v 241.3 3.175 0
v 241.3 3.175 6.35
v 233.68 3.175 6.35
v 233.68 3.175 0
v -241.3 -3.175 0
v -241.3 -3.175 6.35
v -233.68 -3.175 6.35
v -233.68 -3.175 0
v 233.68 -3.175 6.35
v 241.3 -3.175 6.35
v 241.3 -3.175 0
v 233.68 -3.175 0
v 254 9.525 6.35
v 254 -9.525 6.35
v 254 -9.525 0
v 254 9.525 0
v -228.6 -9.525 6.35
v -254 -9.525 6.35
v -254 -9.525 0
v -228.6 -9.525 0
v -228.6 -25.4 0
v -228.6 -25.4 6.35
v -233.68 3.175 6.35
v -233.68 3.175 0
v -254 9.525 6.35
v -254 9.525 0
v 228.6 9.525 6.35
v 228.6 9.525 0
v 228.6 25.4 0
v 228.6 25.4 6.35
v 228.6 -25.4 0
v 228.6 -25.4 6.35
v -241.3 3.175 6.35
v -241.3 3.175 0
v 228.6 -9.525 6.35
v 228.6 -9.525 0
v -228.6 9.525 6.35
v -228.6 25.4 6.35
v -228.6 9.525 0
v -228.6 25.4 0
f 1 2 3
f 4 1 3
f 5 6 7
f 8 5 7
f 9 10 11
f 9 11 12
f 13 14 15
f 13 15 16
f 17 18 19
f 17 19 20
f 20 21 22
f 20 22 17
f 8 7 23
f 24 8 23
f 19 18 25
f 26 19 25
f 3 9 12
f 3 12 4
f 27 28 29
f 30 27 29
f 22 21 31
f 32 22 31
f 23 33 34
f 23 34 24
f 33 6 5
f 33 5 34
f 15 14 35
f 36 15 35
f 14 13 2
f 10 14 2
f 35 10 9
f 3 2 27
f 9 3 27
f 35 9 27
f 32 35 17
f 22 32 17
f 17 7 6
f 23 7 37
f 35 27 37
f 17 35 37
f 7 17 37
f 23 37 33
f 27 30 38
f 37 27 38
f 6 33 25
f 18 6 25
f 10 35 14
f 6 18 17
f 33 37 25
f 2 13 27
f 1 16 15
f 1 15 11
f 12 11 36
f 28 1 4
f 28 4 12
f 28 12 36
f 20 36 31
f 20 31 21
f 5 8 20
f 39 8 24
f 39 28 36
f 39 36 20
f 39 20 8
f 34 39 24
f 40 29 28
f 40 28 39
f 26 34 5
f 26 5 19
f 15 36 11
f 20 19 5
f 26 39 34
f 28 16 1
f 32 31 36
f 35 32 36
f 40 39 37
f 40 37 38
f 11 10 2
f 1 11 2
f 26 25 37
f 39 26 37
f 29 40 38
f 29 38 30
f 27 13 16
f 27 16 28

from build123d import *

# Parameters (mm, degrees)
SKETCH1_W           = 457.2
SKETCH1_H           = 50.8
BOSS_EXTRUDE1_DEPTH = 6.35
SKETCH2_W           = 50.8
SKETCH2_H           = 19.05
BOSS_EXTRUDE2_DEPTH = 6.35
SKETCH3_W           = 7.62
SKETCH3_H           = 6.35
CUT_EXTRUDE1_DEPTH  = 7.35


with BuildPart() as part:
    # Sketch1 → Boss-Extrude1 (new body)
    with BuildSketch(Plane.XY):
        Rectangle(SKETCH1_W, SKETCH1_H)
    extrude(amount=BOSS_EXTRUDE1_DEPTH)

    # Sketch2 → Boss-Extrude2 (add)
    with BuildSketch(Plane.XY.offset(6.35)):
        with Locations((-228.6, 0)):
            Rectangle(SKETCH2_W, SKETCH2_H)
    boss_extrude2 = extrude(amount=-BOSS_EXTRUDE2_DEPTH)

    # Sketch3 → Cut-Extrude1 (cut, through all)
    with BuildSketch(Plane.XY.offset(6.35)):
        with Locations((-237.49, 0)):
            Rectangle(SKETCH3_W, SKETCH3_H)
    cut_extrude1 = extrude(amount=-CUT_EXTRUDE1_DEPTH, mode=Mode.SUBTRACT)

    # Mirror1: Boss-Extrude2, Cut-Extrude1 across plane
    add(boss_extrude2.mirror(Plane(origin=(0, 0, 0), x_dir=(0, 0, 1), z_dir=(1, 0, 0))))
    add(cut_extrude1.mirror(Plane(origin=(0, 0, 0), x_dir=(0, 0, 1), z_dir=(1, 0, 0))), mode=Mode.SUBTRACT)


solid = part.part
